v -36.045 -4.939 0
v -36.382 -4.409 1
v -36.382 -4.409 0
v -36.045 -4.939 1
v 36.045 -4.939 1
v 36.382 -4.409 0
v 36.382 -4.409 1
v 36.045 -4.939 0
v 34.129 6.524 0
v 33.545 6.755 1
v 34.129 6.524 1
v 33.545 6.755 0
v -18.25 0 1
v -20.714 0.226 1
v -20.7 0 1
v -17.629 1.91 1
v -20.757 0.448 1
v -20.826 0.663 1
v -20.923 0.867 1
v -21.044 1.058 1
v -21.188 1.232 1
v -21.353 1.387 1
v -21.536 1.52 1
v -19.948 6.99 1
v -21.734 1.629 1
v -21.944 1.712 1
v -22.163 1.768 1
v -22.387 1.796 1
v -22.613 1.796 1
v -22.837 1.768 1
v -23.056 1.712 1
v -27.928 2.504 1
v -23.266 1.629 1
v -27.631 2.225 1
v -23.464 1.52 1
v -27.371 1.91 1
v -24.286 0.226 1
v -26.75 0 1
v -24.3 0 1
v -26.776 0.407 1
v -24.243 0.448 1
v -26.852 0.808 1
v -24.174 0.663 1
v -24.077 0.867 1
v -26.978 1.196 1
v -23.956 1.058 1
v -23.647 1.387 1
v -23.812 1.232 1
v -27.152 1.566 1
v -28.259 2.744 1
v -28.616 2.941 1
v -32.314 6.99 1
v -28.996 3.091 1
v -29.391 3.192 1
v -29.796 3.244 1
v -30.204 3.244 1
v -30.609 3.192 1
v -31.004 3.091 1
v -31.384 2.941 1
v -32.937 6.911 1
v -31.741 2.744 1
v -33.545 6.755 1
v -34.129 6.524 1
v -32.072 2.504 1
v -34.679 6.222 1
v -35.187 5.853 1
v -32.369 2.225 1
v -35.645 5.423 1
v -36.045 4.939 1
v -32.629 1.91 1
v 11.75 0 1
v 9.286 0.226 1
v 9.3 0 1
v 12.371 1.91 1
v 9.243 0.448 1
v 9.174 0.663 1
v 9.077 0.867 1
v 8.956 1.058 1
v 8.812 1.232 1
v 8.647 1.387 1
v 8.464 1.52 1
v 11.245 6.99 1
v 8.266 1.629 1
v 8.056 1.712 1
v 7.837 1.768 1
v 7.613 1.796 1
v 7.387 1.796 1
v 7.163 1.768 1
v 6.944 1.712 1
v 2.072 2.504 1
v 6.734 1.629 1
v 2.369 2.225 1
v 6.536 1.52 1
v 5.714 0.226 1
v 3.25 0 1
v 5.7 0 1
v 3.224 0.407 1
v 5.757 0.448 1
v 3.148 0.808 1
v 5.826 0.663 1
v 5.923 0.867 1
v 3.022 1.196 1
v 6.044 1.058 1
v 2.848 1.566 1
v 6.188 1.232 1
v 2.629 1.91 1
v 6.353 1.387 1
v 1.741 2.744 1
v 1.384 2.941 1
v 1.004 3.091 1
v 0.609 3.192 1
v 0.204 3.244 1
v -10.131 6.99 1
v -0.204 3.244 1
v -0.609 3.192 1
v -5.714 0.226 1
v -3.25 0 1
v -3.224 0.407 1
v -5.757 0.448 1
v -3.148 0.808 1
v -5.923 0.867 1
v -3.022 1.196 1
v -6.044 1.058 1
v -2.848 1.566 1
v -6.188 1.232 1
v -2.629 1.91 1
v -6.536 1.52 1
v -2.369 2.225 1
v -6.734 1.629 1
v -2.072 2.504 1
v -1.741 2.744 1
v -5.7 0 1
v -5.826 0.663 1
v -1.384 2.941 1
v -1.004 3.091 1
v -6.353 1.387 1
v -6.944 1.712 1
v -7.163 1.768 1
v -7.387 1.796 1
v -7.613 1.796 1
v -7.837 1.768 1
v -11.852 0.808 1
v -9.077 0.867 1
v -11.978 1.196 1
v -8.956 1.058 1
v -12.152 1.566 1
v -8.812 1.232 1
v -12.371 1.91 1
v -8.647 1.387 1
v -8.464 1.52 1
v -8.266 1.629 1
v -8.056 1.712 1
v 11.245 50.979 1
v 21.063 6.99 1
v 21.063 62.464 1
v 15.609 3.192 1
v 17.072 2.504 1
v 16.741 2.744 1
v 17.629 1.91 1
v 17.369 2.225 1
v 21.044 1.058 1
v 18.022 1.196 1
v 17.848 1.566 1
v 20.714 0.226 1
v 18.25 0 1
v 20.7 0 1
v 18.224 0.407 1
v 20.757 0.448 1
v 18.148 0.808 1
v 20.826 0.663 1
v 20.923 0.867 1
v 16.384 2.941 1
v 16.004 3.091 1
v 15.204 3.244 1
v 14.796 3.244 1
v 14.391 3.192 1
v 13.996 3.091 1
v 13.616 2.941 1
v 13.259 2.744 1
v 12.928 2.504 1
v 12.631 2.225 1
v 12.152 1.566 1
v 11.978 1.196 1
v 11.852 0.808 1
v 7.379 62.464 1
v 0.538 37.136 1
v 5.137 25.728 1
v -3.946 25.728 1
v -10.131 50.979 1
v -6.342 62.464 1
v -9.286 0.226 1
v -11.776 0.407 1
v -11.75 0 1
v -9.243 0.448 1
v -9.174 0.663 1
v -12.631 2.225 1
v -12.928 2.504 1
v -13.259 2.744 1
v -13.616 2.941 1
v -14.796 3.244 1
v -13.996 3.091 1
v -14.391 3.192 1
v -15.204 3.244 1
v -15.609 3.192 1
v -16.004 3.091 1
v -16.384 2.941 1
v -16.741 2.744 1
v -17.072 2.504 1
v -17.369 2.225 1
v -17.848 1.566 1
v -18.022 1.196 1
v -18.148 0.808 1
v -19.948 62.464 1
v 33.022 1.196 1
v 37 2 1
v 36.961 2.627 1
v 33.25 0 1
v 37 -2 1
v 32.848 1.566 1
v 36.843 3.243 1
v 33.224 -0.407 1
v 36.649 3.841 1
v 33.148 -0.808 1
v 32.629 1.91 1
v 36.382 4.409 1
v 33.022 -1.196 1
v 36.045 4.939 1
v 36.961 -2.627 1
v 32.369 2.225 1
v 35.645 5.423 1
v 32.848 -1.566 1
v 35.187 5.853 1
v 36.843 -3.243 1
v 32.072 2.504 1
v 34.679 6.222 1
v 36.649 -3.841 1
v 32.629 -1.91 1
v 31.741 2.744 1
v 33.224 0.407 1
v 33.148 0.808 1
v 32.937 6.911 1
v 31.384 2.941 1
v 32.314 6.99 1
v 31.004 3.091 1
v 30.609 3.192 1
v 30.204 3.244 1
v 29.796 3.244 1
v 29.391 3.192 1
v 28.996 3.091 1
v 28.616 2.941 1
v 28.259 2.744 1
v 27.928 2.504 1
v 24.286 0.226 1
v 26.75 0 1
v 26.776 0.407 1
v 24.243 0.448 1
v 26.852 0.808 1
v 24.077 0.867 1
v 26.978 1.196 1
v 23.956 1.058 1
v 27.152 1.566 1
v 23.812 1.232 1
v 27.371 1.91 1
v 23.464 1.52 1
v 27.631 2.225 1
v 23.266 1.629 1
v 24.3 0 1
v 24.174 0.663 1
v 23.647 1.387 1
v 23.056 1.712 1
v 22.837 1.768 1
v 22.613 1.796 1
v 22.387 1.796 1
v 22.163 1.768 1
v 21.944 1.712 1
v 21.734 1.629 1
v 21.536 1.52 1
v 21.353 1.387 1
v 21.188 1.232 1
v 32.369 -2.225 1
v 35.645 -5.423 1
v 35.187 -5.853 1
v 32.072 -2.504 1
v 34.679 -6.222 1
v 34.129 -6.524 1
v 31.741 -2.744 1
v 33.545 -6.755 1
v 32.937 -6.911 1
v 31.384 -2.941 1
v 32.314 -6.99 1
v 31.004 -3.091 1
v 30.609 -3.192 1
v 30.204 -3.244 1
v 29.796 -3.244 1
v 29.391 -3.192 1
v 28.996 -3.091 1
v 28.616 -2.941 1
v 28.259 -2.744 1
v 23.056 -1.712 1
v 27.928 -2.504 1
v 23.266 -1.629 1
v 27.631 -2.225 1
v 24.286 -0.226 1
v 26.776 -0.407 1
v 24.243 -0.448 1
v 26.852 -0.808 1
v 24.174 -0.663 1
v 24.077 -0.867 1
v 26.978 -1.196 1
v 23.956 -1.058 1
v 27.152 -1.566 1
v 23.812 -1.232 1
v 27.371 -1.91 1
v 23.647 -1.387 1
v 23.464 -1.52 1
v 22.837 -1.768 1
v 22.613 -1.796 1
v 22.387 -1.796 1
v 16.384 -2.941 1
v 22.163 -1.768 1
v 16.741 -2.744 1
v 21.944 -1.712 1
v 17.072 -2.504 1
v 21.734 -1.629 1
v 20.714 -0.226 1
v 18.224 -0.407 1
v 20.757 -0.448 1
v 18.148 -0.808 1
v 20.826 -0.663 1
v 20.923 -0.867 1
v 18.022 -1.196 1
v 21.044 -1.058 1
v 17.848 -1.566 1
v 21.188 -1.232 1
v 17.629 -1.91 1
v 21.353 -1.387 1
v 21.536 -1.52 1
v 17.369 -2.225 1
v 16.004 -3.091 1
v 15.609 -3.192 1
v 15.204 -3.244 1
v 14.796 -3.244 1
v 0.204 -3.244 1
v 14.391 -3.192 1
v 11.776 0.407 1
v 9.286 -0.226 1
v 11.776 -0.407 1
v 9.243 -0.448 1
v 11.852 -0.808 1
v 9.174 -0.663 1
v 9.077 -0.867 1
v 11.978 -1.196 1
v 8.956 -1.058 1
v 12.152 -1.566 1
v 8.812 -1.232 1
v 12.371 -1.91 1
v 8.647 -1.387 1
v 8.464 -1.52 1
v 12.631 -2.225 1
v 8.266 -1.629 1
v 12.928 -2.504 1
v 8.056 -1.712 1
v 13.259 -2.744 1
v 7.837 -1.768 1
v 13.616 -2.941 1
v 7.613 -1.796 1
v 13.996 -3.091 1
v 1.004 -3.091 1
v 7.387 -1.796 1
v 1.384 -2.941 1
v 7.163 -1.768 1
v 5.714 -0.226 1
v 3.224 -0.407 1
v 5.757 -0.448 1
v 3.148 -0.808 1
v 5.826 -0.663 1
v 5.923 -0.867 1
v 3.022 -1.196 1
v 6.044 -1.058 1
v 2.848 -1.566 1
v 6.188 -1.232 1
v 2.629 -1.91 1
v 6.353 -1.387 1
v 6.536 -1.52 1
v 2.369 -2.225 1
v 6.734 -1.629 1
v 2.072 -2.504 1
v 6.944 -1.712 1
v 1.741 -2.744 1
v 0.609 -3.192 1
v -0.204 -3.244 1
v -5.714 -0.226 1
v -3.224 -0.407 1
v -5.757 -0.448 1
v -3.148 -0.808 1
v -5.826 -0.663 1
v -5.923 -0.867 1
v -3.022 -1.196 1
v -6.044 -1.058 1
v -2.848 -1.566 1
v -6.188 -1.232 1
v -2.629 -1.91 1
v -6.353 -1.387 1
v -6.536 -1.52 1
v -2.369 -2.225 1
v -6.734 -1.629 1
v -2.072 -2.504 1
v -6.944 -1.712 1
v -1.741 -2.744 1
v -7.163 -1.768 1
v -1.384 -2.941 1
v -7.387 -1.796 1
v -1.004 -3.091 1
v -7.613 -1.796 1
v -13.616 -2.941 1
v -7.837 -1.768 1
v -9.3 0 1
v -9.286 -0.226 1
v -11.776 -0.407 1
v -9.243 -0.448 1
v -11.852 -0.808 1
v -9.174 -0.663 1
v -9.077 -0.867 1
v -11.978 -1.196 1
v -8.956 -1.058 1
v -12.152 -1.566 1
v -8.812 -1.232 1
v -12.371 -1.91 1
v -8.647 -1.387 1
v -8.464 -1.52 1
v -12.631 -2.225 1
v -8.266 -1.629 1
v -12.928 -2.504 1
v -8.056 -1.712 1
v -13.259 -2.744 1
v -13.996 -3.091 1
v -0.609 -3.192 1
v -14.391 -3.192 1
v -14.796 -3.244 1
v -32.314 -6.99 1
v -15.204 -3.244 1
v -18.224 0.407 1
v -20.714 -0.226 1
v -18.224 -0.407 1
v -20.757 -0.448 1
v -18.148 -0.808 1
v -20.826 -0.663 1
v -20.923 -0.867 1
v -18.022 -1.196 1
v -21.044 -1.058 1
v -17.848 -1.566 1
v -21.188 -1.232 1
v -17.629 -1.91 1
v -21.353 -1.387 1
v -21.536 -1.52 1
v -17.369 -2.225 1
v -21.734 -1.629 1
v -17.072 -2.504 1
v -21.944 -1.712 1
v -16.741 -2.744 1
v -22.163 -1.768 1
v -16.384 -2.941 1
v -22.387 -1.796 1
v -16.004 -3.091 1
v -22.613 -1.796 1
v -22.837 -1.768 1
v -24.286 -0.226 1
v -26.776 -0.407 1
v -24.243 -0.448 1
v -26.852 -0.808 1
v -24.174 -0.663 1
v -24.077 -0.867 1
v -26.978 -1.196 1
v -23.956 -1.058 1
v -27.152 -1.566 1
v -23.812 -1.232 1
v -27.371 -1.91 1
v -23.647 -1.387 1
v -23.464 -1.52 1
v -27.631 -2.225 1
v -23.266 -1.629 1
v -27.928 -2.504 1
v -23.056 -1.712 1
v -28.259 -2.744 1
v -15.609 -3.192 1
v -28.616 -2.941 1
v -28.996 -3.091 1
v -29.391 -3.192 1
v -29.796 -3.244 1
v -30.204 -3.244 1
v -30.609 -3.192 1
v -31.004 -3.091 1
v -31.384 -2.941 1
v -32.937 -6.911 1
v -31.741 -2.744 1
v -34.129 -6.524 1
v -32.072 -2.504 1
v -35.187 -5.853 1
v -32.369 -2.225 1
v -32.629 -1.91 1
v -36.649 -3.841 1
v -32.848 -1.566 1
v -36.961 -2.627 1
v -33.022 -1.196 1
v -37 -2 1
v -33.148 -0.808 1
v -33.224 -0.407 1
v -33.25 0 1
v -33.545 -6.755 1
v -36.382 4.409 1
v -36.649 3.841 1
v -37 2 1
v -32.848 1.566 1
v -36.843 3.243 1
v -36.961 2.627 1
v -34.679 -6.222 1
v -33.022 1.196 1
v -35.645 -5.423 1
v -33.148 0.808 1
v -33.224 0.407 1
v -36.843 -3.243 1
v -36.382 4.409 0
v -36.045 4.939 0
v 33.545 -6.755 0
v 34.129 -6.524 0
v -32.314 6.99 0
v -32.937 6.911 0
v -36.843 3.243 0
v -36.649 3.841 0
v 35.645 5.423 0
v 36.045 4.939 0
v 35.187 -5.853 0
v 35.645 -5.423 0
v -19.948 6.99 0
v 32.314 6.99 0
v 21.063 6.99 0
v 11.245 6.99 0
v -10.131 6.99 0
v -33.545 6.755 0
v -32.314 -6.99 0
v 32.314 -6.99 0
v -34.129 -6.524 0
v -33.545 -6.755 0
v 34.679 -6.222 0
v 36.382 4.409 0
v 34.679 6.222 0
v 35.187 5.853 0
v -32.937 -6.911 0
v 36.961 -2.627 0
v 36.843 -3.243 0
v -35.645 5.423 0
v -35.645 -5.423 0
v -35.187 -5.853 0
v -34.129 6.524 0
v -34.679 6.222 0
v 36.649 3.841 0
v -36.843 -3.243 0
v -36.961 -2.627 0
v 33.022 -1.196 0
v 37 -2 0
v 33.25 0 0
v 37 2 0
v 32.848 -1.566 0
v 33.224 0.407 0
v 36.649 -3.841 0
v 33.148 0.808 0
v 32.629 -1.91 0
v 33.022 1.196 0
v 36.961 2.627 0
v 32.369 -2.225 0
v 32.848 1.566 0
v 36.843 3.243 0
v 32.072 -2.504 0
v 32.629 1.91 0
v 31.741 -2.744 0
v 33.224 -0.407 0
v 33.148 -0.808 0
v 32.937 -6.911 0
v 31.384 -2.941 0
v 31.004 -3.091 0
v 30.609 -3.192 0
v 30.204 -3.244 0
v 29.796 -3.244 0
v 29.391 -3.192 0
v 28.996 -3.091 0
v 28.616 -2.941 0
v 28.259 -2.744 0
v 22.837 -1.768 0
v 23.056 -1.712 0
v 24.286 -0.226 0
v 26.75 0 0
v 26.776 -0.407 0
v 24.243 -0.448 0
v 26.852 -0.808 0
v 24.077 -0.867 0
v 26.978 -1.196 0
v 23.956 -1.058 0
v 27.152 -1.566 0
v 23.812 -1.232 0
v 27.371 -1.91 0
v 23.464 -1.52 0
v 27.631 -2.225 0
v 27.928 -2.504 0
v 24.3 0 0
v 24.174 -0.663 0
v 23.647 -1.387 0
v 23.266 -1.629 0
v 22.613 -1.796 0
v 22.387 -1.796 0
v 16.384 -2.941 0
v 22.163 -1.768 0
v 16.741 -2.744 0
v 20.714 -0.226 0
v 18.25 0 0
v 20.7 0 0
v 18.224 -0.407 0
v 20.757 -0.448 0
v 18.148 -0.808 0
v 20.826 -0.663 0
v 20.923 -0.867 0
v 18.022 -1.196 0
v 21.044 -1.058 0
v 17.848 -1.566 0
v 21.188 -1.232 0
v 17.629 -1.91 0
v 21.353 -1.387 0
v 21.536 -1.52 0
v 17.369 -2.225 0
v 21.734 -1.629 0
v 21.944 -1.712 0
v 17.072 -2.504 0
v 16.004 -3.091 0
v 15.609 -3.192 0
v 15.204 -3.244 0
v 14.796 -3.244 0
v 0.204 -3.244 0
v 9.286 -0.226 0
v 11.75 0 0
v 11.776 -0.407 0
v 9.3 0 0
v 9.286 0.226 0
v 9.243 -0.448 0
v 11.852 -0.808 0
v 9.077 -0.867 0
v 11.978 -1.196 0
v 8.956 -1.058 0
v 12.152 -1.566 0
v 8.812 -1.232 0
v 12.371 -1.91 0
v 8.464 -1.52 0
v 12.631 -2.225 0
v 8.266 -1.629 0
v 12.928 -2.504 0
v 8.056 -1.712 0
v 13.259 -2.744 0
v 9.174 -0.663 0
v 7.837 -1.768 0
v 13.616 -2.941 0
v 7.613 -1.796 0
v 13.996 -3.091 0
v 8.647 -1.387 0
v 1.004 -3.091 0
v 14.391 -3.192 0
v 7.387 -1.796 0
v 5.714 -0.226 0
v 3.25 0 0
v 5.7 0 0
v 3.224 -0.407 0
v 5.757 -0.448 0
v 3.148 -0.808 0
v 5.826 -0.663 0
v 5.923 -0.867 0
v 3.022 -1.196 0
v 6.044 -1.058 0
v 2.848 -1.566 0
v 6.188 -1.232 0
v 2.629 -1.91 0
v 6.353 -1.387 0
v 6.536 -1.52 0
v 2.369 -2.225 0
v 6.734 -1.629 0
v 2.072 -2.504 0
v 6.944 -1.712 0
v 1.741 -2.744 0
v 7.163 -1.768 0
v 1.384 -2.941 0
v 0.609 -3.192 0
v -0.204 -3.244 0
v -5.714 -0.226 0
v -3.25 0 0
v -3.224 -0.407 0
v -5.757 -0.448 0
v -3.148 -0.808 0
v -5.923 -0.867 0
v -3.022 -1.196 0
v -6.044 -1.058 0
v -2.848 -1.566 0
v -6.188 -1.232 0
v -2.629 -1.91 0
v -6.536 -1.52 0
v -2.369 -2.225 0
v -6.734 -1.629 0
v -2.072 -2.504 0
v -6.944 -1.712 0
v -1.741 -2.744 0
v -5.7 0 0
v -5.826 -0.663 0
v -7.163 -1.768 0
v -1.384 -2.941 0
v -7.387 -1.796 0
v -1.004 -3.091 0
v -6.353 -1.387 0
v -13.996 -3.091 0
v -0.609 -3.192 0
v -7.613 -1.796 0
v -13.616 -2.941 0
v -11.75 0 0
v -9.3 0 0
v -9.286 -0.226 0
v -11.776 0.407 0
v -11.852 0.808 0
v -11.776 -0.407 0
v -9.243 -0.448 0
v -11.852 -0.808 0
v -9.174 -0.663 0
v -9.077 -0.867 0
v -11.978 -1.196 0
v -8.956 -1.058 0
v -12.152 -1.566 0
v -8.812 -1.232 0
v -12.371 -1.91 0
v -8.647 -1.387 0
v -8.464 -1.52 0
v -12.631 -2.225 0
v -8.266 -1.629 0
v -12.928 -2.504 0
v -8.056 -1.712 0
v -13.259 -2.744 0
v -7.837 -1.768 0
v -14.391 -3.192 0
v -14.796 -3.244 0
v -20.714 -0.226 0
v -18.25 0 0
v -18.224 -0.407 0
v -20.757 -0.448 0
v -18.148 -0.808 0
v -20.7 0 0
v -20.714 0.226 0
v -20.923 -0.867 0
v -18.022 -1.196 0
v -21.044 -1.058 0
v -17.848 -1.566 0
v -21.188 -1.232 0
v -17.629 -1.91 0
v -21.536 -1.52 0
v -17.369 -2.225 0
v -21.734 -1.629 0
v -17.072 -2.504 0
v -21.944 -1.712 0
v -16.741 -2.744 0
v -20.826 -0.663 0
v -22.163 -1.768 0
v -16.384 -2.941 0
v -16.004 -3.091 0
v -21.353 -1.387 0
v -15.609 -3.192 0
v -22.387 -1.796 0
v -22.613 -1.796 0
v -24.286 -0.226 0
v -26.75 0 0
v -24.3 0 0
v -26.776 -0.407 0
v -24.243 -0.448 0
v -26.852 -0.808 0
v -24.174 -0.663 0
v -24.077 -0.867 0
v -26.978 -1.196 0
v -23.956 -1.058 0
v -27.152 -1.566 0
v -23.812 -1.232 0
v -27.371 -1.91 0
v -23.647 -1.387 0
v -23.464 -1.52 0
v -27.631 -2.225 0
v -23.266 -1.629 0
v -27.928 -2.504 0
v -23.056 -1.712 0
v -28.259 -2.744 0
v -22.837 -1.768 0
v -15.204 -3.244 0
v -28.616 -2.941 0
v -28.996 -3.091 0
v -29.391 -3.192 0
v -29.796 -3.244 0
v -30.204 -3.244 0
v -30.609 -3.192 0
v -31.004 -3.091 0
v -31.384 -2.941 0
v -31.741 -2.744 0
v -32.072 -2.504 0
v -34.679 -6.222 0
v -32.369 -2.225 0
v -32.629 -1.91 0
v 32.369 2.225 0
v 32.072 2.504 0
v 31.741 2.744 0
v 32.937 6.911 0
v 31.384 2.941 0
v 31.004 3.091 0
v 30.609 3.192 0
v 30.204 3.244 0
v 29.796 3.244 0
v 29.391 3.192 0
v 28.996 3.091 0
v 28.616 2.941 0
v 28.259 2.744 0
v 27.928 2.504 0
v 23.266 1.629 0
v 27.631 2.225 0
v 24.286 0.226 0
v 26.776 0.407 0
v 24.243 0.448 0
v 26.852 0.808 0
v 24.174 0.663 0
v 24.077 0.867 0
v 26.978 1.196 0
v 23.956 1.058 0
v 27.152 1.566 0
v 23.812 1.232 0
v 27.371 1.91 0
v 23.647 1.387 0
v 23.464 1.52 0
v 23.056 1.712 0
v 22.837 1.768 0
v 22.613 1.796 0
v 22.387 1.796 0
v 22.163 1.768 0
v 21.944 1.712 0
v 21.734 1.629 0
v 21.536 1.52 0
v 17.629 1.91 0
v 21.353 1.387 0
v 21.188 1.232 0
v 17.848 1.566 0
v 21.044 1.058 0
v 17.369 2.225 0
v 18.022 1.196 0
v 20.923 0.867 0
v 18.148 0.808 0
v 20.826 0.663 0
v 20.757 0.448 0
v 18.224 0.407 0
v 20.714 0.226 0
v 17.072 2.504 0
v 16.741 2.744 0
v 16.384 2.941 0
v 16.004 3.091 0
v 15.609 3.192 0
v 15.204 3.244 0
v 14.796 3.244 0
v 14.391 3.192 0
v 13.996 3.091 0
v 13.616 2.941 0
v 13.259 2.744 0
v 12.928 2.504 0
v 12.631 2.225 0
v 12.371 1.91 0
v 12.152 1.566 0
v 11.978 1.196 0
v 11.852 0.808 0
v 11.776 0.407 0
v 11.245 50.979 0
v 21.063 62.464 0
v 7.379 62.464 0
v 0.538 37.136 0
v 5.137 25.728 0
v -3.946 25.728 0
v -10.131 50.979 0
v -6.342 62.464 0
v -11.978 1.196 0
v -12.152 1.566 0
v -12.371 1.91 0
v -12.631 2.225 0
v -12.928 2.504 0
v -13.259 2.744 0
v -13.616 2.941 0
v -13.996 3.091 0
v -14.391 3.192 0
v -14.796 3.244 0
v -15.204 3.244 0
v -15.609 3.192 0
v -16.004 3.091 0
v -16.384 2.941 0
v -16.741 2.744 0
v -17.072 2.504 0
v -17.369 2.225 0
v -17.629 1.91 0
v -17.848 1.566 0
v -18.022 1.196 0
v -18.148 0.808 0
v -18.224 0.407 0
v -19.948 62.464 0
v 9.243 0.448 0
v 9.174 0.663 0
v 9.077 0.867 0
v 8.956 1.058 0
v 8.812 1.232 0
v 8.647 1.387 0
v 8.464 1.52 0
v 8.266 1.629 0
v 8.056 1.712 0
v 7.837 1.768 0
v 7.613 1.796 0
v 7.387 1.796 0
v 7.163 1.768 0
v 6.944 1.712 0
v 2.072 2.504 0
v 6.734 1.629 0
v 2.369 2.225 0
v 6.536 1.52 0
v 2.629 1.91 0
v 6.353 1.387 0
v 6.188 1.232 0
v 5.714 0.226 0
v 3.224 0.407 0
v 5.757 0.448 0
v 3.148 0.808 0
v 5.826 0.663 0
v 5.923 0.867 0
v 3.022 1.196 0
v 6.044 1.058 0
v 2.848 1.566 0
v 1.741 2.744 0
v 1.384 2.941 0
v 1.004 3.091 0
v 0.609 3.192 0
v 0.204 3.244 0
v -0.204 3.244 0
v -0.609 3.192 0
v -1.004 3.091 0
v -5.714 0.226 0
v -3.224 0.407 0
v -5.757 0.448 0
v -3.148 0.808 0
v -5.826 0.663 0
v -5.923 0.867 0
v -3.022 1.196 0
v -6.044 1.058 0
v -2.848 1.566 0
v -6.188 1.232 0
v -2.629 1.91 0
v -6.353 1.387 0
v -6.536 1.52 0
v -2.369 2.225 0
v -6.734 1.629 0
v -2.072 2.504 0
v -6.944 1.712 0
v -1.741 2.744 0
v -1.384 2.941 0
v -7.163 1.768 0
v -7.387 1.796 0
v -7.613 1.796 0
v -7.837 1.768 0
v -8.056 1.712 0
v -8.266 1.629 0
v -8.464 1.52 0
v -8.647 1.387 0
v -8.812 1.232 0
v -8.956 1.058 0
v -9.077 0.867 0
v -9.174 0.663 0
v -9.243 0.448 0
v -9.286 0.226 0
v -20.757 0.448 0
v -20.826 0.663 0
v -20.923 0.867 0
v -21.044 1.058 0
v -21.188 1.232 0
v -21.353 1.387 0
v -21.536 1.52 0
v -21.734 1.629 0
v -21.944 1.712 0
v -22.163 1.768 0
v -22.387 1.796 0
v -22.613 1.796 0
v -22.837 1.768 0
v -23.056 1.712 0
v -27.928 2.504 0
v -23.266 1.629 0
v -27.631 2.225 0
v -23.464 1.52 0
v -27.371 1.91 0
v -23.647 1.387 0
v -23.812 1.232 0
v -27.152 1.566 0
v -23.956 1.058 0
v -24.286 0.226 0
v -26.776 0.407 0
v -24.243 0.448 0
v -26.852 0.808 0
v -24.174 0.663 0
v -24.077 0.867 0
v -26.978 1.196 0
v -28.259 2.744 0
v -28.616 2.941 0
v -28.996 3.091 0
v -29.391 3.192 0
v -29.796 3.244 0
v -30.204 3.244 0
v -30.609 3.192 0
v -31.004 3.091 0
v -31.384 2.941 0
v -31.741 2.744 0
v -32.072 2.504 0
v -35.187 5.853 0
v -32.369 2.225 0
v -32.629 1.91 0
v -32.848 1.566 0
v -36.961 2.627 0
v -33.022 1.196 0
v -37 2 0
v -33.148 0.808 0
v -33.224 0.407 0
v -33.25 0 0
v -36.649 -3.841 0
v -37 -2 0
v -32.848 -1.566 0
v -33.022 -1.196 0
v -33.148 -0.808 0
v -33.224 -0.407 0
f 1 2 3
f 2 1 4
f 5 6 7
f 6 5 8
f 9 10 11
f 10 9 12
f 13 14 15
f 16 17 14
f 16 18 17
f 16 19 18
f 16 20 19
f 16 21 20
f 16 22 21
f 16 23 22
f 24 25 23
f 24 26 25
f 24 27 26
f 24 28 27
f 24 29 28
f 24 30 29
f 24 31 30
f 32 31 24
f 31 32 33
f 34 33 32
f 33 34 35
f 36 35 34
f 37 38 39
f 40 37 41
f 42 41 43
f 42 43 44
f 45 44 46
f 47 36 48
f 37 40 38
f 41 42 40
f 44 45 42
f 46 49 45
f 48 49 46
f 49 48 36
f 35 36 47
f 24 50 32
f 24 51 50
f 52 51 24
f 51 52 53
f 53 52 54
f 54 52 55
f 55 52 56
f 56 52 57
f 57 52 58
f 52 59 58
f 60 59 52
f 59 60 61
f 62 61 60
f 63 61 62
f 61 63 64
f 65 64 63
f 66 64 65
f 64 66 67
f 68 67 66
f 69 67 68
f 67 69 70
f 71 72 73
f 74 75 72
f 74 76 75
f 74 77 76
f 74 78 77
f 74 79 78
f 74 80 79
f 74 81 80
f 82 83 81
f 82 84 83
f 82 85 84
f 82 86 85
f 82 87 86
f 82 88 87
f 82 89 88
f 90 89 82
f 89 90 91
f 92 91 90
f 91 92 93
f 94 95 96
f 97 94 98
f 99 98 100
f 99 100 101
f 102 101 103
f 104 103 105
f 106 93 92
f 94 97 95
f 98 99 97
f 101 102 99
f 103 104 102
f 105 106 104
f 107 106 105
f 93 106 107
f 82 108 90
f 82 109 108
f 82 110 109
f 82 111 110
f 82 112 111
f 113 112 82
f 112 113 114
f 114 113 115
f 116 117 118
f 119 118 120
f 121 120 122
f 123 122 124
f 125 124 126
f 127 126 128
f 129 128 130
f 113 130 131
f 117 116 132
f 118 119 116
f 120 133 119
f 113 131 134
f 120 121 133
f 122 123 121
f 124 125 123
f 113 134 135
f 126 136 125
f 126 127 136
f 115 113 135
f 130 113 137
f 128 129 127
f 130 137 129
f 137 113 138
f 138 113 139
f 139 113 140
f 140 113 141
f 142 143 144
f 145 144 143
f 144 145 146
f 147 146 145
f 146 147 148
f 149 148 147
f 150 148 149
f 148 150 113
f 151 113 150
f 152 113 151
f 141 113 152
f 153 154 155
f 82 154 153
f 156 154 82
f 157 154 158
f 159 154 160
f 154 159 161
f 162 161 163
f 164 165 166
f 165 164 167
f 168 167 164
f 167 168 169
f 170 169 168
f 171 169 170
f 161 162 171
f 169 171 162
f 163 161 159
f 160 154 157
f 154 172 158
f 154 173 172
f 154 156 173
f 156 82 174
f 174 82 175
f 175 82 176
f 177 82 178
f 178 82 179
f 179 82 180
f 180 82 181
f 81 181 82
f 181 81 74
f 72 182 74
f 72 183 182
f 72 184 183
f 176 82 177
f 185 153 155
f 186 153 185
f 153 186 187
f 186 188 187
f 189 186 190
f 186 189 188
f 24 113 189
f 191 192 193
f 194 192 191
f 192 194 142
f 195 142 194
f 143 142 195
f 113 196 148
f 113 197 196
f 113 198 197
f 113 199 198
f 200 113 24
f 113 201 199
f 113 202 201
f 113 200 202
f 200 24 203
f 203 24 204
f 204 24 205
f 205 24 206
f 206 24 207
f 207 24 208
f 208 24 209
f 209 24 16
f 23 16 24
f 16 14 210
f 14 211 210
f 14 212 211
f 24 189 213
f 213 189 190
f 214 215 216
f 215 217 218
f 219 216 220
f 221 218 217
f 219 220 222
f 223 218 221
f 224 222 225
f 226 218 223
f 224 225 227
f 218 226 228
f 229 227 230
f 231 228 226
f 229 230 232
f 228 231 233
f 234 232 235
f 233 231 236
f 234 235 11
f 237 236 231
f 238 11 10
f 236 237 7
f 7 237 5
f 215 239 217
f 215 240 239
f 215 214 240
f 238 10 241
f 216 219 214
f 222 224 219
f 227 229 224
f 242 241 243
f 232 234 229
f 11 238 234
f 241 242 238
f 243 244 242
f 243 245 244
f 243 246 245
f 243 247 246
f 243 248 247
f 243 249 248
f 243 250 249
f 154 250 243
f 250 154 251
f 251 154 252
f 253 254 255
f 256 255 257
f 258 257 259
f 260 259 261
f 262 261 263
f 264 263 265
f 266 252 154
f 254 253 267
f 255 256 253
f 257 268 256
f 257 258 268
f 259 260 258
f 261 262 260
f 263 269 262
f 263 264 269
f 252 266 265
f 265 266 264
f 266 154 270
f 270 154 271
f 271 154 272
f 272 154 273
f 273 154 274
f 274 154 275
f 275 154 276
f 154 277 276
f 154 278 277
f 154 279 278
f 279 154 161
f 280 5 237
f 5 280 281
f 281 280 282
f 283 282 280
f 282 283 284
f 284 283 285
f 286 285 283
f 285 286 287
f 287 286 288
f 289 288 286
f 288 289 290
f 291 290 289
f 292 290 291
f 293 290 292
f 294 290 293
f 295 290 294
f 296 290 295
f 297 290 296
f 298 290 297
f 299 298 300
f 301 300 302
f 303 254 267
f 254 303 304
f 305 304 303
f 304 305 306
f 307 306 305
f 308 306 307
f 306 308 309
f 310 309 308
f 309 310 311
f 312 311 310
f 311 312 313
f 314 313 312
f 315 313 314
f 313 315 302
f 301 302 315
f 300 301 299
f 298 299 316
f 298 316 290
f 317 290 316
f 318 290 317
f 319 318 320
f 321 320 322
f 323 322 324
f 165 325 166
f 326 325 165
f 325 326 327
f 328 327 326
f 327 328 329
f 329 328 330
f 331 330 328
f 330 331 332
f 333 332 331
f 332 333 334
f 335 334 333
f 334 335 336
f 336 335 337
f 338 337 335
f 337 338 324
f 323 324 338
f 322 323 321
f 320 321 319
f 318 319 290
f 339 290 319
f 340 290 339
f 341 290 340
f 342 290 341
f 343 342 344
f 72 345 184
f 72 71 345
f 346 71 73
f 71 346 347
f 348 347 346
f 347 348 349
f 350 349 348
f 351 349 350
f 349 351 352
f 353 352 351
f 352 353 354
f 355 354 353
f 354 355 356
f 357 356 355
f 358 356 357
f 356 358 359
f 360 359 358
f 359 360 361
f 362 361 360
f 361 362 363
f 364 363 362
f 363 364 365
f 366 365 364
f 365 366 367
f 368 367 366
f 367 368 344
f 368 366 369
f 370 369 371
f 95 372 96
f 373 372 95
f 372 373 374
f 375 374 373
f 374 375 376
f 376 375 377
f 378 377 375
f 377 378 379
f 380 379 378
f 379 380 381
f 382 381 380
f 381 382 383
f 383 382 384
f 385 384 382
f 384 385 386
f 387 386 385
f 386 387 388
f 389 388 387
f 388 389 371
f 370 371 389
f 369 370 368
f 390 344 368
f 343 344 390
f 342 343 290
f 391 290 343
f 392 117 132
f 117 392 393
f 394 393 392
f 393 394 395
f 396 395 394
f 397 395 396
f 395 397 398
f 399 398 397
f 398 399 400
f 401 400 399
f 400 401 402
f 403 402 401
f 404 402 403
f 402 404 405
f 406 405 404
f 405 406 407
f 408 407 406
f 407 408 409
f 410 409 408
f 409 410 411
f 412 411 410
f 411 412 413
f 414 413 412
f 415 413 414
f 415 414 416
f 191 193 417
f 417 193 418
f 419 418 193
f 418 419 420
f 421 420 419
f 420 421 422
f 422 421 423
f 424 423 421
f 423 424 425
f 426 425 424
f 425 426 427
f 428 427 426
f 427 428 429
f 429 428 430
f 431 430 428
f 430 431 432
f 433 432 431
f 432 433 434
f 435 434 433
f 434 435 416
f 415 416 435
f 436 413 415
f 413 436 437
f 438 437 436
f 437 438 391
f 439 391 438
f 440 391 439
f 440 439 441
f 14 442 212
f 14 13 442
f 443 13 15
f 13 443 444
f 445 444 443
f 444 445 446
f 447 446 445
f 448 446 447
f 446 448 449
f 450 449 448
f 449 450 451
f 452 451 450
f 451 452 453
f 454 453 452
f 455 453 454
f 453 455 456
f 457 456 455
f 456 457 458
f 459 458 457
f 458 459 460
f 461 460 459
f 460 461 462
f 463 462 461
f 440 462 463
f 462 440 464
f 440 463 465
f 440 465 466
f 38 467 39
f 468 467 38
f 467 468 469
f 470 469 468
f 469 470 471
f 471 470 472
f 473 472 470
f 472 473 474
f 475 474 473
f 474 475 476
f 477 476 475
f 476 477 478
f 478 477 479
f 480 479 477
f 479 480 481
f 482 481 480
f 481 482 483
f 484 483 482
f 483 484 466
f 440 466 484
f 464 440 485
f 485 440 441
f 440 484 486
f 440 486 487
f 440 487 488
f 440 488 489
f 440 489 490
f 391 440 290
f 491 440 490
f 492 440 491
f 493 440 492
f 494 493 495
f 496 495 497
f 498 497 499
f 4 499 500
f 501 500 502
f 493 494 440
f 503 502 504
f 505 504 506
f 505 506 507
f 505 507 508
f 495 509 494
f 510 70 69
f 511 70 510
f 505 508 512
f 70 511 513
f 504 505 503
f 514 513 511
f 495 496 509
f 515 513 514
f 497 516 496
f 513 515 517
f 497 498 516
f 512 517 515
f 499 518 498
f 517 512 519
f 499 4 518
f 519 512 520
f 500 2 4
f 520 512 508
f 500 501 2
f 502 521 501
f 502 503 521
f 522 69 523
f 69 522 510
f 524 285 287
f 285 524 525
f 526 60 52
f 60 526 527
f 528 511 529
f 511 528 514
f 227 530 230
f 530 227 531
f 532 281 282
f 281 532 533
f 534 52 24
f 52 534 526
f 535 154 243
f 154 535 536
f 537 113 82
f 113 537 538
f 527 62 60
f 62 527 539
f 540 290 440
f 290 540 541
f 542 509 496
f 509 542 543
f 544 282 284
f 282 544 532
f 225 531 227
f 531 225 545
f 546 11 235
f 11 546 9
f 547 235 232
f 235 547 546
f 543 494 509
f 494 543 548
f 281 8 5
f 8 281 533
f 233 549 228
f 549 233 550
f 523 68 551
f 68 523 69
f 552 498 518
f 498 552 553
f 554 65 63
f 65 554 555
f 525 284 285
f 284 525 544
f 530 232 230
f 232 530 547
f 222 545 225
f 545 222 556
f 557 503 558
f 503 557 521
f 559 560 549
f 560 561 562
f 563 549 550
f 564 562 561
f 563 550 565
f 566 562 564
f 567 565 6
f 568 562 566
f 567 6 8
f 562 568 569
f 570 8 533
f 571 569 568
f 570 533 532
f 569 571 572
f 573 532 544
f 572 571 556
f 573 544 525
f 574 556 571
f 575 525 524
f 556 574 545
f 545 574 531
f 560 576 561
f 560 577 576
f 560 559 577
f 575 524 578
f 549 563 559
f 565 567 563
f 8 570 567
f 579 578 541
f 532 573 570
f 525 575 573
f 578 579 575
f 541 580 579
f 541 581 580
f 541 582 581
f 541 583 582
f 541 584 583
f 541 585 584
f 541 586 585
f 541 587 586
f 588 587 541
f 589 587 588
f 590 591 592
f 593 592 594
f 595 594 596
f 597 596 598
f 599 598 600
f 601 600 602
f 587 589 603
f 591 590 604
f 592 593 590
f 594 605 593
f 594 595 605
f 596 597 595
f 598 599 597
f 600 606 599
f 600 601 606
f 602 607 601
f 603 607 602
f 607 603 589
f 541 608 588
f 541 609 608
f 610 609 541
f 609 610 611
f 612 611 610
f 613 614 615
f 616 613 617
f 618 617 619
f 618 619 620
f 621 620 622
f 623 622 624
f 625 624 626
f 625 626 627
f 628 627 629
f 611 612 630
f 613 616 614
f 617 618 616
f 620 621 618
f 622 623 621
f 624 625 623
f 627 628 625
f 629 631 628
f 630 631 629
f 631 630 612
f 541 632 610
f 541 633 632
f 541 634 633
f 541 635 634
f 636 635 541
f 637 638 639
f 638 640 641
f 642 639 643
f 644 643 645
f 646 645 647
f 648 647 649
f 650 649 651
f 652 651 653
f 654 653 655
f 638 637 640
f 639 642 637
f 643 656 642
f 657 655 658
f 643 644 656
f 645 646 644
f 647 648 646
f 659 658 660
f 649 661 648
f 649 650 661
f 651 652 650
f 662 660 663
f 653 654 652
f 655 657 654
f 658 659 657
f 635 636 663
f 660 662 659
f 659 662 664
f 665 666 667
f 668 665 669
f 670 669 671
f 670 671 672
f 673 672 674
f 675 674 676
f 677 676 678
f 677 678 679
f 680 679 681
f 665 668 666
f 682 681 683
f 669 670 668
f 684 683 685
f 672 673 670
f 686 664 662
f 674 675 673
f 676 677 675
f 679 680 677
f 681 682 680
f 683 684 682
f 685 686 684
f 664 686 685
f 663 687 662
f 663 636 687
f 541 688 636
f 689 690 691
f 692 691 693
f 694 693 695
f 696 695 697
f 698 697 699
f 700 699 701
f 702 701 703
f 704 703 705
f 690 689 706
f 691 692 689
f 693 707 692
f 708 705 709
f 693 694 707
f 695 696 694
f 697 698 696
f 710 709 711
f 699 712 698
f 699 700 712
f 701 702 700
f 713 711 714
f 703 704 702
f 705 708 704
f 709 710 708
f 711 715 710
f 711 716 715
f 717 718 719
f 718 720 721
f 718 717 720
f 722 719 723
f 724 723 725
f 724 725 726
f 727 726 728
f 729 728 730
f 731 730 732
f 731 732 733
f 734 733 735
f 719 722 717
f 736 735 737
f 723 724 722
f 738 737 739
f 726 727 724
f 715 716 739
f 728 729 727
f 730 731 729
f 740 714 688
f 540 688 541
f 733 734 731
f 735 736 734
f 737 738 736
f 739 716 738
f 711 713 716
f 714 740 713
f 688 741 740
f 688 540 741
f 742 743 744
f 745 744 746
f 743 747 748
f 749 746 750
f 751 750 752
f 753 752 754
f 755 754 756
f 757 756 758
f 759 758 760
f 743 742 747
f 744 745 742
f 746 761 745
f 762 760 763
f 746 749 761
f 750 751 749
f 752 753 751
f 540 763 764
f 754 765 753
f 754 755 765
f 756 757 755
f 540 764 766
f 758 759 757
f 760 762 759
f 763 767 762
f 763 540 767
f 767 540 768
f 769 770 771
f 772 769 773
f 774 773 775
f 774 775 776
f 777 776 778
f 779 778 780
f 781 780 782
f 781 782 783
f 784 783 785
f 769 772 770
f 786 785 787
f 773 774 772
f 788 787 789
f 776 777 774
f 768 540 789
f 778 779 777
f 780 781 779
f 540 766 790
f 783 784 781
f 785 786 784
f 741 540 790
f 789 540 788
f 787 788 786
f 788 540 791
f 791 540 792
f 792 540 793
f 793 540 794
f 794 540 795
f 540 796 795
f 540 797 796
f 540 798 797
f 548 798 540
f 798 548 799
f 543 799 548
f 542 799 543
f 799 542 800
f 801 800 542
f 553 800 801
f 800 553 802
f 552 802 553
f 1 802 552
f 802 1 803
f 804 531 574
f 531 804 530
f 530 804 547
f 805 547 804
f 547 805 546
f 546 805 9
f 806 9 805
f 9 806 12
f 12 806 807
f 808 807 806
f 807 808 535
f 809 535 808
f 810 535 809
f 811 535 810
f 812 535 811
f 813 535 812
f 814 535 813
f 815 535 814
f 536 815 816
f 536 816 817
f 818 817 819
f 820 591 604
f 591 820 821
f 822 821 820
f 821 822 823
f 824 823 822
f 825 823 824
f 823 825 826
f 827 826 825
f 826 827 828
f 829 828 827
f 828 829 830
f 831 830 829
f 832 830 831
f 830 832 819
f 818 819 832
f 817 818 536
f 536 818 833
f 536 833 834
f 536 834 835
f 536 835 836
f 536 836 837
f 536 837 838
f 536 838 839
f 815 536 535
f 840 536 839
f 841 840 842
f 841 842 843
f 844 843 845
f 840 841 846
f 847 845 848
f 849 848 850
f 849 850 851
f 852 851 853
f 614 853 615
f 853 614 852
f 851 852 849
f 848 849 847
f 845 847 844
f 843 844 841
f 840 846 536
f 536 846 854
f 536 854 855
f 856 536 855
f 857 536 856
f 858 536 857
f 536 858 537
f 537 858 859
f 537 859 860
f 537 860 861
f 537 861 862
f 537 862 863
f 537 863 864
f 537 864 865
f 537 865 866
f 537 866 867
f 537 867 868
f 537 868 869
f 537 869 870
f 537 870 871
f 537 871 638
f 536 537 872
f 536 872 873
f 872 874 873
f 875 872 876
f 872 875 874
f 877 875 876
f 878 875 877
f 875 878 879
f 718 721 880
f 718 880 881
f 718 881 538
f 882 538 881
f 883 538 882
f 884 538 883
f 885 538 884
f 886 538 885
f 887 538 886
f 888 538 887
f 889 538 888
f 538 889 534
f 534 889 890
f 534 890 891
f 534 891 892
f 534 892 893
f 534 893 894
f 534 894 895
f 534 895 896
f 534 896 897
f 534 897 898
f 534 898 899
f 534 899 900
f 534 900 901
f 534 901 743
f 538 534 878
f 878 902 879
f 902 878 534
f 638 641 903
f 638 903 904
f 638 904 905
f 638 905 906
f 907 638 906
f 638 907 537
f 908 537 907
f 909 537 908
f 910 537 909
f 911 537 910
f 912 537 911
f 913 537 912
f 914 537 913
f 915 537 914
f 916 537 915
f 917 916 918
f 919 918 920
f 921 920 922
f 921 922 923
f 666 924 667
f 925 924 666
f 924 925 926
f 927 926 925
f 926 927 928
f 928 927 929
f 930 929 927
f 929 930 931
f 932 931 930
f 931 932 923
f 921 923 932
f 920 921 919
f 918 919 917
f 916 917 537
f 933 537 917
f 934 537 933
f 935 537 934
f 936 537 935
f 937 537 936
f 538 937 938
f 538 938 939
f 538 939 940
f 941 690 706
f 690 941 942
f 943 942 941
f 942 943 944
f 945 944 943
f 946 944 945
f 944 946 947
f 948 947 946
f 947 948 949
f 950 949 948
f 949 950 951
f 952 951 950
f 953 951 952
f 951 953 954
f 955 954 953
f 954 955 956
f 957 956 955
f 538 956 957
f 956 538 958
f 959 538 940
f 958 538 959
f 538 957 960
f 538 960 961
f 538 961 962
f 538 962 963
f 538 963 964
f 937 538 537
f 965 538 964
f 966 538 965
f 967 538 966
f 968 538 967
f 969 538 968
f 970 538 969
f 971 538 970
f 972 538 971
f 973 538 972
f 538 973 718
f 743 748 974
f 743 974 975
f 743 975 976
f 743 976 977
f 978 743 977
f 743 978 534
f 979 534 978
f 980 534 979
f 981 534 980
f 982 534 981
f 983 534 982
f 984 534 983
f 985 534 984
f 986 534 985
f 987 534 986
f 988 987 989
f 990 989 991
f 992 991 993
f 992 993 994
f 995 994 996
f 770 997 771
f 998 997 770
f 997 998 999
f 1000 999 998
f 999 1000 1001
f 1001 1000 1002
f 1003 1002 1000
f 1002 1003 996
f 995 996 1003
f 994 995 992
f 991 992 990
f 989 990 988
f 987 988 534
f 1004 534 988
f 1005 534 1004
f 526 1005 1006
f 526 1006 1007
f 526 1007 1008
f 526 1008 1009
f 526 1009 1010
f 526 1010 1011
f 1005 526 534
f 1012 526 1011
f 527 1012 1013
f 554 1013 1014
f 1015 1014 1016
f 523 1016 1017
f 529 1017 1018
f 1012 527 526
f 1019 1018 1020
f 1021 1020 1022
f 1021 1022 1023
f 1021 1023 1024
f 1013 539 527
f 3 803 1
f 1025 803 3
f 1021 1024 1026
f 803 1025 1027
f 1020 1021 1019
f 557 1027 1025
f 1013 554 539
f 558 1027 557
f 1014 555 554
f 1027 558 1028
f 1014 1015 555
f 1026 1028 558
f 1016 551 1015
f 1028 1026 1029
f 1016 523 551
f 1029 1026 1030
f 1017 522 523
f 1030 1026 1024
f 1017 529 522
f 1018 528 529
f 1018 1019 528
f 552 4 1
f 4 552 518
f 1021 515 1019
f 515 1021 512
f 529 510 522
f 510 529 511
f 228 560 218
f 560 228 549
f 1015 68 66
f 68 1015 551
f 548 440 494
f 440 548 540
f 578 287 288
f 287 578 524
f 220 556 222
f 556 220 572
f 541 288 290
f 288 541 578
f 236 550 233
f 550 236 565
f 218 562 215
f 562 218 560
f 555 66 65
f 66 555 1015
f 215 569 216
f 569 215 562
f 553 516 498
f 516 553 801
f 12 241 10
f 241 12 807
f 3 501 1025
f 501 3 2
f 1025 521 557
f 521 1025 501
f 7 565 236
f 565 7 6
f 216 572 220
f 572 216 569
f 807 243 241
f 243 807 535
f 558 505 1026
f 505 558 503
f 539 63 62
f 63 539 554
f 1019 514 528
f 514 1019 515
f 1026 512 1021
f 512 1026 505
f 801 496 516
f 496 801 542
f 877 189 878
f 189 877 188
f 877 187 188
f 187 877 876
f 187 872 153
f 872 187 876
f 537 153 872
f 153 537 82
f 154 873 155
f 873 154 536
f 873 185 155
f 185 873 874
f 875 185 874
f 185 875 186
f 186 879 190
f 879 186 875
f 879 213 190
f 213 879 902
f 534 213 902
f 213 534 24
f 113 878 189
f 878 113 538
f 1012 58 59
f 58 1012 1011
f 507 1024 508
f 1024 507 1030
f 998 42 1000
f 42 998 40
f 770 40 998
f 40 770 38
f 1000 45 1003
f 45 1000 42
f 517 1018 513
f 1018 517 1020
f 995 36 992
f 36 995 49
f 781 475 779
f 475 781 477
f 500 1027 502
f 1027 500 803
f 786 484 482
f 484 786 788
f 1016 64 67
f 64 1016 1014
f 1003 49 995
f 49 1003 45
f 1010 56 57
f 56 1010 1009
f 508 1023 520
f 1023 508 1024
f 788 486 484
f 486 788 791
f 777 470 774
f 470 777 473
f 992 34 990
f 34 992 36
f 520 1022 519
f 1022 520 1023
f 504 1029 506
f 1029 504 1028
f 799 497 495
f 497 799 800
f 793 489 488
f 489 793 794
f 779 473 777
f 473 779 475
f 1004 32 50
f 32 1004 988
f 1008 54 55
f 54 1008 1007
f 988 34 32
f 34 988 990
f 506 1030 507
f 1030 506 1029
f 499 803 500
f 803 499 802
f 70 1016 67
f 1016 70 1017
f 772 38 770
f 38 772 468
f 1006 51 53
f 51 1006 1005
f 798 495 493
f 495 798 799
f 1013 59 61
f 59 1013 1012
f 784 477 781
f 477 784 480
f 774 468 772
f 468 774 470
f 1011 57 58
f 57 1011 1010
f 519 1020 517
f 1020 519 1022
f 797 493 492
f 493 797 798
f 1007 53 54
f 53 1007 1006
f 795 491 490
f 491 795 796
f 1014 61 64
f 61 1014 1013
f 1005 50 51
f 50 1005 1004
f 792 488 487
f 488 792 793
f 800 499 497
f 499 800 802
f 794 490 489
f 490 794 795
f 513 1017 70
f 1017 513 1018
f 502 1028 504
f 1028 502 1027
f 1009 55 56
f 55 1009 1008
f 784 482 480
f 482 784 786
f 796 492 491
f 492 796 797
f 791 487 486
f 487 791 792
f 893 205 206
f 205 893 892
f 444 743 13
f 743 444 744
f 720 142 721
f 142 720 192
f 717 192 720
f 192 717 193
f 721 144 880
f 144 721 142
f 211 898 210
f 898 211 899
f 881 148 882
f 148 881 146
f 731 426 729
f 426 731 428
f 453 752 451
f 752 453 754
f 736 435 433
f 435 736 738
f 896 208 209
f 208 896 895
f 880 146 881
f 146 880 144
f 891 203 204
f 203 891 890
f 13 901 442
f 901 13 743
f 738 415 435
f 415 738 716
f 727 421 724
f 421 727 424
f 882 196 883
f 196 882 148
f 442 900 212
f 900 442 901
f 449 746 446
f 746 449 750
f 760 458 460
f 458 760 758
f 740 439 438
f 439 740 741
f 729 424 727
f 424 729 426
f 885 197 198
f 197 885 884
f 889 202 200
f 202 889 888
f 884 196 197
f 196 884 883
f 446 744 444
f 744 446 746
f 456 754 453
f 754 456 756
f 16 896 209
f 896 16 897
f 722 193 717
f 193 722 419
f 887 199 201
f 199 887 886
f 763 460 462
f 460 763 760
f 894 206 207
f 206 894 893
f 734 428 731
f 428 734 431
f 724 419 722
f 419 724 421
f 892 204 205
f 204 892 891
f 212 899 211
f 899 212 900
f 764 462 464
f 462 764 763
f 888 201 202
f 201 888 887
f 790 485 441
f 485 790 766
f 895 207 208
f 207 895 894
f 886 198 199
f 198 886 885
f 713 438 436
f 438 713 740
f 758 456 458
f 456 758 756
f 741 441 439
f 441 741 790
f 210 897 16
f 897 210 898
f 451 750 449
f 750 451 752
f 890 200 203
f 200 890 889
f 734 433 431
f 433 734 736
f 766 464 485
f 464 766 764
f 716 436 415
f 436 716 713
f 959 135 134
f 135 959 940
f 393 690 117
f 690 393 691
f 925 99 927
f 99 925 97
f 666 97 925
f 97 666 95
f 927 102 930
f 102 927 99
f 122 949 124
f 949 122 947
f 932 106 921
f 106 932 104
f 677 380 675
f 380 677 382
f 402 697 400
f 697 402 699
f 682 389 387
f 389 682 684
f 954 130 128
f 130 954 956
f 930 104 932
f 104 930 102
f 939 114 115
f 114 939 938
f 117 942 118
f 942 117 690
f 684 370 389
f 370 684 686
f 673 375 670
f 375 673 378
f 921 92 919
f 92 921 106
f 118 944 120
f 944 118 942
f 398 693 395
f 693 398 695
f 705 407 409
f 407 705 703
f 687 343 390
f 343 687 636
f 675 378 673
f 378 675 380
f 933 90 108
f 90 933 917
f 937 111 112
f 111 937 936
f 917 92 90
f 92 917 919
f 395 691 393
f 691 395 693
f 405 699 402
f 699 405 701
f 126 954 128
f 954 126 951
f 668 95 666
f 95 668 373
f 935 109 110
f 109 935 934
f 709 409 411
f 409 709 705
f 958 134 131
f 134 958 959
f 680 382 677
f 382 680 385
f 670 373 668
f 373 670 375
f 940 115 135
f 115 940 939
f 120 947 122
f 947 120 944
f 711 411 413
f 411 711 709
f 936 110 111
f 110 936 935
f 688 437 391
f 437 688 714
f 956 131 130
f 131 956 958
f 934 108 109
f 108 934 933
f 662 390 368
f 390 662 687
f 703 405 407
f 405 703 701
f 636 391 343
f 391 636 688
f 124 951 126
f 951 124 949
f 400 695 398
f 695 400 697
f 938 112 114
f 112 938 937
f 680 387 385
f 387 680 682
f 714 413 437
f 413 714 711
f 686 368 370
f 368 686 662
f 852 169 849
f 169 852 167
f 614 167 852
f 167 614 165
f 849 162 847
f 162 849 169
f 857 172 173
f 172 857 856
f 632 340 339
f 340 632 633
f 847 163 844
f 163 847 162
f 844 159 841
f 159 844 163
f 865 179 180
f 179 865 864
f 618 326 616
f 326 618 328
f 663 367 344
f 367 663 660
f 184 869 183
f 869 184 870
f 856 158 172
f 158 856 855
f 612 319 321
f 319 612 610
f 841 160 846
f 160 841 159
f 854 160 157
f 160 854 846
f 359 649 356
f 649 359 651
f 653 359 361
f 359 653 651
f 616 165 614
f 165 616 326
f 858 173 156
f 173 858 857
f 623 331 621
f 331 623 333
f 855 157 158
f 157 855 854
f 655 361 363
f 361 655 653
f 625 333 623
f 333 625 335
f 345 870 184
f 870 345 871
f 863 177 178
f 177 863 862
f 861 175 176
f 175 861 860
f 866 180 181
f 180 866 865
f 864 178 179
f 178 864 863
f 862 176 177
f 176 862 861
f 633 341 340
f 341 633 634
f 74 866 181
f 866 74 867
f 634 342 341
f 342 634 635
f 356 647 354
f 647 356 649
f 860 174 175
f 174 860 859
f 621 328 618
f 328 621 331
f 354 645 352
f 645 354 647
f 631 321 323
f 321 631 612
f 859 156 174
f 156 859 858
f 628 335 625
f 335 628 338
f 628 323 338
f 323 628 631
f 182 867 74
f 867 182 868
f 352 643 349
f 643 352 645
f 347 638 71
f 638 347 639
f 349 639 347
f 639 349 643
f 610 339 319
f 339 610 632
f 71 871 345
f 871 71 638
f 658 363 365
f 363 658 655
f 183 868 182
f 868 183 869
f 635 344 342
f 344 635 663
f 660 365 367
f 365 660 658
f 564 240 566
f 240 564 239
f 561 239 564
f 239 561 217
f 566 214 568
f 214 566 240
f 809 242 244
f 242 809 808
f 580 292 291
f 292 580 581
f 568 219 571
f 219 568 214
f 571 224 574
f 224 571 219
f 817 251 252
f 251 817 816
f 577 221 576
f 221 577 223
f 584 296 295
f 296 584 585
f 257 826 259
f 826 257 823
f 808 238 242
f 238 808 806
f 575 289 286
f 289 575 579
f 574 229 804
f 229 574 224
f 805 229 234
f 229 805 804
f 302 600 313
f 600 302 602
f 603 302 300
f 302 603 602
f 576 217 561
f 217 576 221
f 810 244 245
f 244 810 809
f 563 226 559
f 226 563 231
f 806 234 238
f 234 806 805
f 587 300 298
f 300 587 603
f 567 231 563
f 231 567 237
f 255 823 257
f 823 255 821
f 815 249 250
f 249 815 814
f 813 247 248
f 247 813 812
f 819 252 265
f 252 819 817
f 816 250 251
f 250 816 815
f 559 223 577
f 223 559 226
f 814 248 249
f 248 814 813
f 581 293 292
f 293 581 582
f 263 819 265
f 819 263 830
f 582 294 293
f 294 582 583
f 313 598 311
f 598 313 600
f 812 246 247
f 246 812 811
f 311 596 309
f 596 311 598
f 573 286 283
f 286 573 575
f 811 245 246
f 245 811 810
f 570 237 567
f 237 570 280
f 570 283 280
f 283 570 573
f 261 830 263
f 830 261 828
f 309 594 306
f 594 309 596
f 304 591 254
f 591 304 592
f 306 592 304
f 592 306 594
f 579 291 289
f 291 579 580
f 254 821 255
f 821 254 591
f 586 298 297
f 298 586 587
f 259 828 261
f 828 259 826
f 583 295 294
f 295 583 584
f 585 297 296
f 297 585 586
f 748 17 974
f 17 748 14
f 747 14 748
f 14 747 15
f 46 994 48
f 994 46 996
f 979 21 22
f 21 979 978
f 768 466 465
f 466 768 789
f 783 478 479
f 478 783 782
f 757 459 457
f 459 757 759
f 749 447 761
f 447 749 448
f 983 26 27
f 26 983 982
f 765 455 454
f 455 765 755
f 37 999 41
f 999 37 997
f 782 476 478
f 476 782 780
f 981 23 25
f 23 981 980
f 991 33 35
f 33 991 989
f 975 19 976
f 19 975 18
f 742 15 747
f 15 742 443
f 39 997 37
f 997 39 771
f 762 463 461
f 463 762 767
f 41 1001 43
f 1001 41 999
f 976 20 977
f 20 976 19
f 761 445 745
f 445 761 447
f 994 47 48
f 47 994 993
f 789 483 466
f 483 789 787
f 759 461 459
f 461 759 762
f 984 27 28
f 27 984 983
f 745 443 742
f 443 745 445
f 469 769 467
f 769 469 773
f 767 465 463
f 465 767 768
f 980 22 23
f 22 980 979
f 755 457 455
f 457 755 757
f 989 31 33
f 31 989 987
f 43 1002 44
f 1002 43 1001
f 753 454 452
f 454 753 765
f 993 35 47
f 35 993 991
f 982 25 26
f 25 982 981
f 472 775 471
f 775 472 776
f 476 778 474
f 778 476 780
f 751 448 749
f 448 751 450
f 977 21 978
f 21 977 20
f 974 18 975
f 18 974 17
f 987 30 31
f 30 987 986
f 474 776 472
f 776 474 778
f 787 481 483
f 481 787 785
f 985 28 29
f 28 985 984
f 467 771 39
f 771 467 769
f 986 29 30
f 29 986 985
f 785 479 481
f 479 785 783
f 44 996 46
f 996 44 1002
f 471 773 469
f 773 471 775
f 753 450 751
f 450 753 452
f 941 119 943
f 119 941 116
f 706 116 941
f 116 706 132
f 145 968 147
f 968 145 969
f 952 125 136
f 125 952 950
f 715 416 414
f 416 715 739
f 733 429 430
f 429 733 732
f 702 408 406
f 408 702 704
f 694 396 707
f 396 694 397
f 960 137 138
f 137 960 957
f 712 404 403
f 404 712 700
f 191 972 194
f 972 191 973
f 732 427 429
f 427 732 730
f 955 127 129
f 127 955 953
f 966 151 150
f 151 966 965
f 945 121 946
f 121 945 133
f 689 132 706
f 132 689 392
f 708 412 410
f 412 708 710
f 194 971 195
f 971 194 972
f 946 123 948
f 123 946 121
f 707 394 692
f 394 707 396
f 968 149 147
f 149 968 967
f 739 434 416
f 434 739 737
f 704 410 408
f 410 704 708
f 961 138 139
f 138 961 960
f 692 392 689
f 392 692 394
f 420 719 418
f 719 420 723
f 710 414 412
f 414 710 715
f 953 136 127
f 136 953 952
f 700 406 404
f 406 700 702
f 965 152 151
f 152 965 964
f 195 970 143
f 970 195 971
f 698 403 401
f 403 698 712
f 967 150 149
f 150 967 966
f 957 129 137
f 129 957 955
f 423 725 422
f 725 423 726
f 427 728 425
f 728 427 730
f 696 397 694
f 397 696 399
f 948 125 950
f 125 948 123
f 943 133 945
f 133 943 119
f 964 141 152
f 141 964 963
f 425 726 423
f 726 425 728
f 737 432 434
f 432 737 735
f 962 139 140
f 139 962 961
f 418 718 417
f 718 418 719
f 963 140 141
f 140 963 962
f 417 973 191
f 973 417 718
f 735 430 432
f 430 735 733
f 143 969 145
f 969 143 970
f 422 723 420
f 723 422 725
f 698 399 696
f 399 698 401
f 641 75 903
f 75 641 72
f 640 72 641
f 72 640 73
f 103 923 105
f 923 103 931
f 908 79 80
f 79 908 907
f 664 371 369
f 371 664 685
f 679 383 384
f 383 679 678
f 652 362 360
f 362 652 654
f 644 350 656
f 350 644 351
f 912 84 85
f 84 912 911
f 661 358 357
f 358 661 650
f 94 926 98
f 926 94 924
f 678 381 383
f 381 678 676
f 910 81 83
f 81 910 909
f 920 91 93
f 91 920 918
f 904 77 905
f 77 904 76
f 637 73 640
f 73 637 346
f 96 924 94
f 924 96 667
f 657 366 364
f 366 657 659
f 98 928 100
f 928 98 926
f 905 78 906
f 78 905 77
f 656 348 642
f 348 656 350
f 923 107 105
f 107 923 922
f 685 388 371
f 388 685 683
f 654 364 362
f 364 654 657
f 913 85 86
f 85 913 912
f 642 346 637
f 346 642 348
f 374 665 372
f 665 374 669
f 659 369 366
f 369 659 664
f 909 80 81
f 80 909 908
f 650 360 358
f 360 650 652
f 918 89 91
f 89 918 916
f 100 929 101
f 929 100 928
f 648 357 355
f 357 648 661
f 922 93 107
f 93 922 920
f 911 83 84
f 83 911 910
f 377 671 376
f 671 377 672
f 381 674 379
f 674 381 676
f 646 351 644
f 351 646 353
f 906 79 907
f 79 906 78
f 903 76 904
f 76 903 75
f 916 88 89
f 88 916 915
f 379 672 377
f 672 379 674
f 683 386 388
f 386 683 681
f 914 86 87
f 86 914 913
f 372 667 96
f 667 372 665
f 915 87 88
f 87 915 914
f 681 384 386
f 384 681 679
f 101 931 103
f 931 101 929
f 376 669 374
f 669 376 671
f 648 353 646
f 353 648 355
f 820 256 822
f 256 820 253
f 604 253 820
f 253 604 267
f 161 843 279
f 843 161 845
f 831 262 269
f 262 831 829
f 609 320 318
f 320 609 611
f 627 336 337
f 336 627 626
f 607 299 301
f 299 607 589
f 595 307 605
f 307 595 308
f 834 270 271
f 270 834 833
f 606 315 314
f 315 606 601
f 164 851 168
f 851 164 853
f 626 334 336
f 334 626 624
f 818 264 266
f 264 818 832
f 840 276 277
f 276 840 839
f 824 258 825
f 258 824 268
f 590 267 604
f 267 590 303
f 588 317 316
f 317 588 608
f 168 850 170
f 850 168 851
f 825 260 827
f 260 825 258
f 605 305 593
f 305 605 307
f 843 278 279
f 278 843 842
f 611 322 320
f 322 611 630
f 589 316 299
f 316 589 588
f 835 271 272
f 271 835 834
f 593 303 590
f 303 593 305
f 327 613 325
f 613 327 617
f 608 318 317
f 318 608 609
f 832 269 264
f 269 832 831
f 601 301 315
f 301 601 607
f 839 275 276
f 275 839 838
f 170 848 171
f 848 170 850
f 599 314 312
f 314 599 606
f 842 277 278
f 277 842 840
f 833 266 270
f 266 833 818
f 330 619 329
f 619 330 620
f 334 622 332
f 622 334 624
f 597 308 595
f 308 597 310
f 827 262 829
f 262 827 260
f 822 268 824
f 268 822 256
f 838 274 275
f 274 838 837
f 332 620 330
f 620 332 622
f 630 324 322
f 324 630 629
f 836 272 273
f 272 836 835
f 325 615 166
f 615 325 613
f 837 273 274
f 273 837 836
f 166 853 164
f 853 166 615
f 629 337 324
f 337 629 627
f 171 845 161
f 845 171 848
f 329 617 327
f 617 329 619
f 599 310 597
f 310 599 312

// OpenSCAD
$fn = 50;


difference() {
	union() {
		hull() {
			translate(v = [-32.0000000000, 2.0000000000, 0]) {
				cylinder(h = 1, r = 5);
			}
			translate(v = [32.0000000000, 2.0000000000, 0]) {
				cylinder(h = 1, r = 5);
			}
			translate(v = [-32.0000000000, -2.0000000000, 0]) {
				cylinder(h = 1, r = 5);
			}
			translate(v = [32.0000000000, -2.0000000000, 0]) {
				cylinder(h = 1, r = 5);
			}
		}
		translate(v = [0, 61.1111111111, 0]) {
			linear_extrude(height = 1) {
				text(font = "DejaVu Sans Mono:style=Bold", halign = "center", size = 57.0000000000, text = "M", valign = "top");
			}
		}
	}
	union() {
		translate(v = [-30.0000000000, 0.0000000000, 0]) {
			translate(v = [0, 0, -100]) {
				cylinder(h = 200, r = 3.2500000000);
			}
		}
		translate(v = [-15.0000000000, 0.0000000000, 0]) {
			translate(v = [0, 0, -100]) {
				cylinder(h = 200, r = 3.2500000000);
			}
		}
		translate(v = [0, 0, -100]) {
			cylinder(h = 200, r = 3.2500000000);
		}
		translate(v = [15.0000000000, 0.0000000000, 0]) {
			translate(v = [0, 0, -100]) {
				cylinder(h = 200, r = 3.2500000000);
			}
		}
		translate(v = [30.0000000000, 0.0000000000, 0]) {
			translate(v = [0, 0, -100]) {
				cylinder(h = 200, r = 3.2500000000);
			}
		}
		translate(v = [-30.0000000000, 0.0000000000, 0]) {
			translate(v = [0, 0, -100]) {
				cylinder(h = 200, r = 1.8000000000);
			}
		}
		translate(v = [-22.5000000000, 0.0000000000, 0]) {
			translate(v = [0, 0, -100]) {
				cylinder(h = 200, r = 1.8000000000);
			}
		}
		translate(v = [-15.0000000000, 0.0000000000, 0]) {
			translate(v = [0, 0, -100]) {
				cylinder(h = 200, r = 1.8000000000);
			}
		}
		translate(v = [-7.5000000000, 0.0000000000, 0]) {
			translate(v = [0, 0, -100]) {
				cylinder(h = 200, r = 1.8000000000);
			}
		}
		translate(v = [0, 0, -100]) {
			cylinder(h = 200, r = 1.8000000000);
		}
		translate(v = [7.5000000000, 0.0000000000, 0]) {
			translate(v = [0, 0, -100]) {
				cylinder(h = 200, r = 1.8000000000);
			}
		}
		translate(v = [15.0000000000, 0.0000000000, 0]) {
			translate(v = [0, 0, -100]) {
				cylinder(h = 200, r = 1.8000000000);
			}
		}
		translate(v = [22.5000000000, 0.0000000000, 0]) {
			translate(v = [0, 0, -100]) {
				cylinder(h = 200, r = 1.8000000000);
			}
		}
		translate(v = [30.0000000000, 0.0000000000, 0]) {
			translate(v = [0, 0, -100]) {
				cylinder(h = 200, r = 1.8000000000);
			}
		}
	}
}
